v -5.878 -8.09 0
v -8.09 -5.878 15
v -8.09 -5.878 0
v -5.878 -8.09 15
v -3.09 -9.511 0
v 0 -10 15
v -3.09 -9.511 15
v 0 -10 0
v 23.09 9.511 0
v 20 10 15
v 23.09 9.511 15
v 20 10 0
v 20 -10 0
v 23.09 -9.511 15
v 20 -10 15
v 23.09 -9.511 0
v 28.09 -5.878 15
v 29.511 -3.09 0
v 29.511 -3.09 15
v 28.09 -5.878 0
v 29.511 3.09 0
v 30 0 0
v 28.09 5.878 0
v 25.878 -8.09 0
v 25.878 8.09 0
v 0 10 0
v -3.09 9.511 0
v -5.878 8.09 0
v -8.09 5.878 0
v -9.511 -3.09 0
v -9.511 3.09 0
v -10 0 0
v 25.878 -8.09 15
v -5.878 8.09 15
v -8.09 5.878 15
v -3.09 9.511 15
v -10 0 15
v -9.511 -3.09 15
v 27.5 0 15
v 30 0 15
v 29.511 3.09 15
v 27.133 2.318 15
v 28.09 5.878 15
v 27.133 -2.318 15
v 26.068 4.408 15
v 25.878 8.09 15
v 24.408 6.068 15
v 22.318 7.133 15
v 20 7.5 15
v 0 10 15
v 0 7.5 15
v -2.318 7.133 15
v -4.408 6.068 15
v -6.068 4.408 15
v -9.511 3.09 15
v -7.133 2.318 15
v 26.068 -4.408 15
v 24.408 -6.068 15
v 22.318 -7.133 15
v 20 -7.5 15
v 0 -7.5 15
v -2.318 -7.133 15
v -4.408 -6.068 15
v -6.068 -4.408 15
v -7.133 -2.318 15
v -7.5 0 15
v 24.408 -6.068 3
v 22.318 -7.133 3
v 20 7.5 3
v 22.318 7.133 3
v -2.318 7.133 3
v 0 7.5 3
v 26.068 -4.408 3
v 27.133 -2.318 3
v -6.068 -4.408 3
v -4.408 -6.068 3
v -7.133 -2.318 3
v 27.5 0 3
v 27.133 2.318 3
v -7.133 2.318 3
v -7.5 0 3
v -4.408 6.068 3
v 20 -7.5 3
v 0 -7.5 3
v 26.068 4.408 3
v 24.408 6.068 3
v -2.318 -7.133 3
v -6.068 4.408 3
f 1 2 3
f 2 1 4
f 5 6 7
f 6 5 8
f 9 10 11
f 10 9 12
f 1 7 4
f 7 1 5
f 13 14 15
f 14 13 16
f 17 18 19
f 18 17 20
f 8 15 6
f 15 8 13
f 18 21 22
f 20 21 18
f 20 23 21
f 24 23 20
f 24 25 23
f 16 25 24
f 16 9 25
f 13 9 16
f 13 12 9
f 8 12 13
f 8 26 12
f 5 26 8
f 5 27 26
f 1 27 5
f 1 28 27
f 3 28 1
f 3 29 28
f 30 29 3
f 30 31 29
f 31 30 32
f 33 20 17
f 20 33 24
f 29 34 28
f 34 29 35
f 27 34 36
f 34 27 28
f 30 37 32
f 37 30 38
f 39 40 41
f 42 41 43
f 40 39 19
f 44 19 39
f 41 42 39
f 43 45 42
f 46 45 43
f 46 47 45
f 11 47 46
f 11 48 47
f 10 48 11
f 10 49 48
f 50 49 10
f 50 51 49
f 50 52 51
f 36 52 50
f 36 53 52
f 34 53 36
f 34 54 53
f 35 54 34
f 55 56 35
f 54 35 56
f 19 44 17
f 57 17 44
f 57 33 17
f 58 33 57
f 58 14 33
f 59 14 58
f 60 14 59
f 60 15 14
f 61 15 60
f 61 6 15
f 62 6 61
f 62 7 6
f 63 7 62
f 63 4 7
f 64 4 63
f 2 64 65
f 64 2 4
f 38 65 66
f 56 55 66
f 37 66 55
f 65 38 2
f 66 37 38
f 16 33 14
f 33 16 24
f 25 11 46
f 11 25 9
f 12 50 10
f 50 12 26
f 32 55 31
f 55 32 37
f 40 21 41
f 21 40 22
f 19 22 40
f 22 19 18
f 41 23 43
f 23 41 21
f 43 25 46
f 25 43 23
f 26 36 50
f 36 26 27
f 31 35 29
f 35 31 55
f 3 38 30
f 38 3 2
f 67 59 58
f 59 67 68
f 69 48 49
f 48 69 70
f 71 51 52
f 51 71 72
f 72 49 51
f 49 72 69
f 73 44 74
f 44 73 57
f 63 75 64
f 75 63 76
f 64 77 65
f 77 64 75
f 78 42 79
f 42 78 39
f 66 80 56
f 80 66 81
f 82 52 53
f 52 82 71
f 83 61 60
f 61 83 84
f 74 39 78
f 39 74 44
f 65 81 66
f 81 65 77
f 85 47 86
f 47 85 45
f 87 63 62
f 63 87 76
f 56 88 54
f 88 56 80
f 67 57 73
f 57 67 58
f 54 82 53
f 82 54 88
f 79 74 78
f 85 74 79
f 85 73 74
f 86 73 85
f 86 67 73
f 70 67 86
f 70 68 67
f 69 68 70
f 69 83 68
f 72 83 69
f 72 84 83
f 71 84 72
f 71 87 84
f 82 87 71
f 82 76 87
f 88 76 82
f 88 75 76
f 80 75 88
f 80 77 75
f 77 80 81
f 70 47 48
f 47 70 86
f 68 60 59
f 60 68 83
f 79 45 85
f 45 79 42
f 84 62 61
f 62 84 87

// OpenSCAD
$fn=20;
box_height=15;
box_capdiameter = 20;
box_length = 20;
wall_thickness = 5;

difference() {
    hull() {
        cylinder(d=box_capdiameter, h=box_height);
        translate([20, 0, 0]) cylinder(d=box_capdiameter, h=box_height);
    }
    translate([0, 0, 3])
    hull() {
        cylinder(d=box_capdiameter-wall_thickness, h=box_height);
        translate([20, 0, 0]) cylinder(d=box_capdiameter-wall_thickness, h=box_height);
    }
}
